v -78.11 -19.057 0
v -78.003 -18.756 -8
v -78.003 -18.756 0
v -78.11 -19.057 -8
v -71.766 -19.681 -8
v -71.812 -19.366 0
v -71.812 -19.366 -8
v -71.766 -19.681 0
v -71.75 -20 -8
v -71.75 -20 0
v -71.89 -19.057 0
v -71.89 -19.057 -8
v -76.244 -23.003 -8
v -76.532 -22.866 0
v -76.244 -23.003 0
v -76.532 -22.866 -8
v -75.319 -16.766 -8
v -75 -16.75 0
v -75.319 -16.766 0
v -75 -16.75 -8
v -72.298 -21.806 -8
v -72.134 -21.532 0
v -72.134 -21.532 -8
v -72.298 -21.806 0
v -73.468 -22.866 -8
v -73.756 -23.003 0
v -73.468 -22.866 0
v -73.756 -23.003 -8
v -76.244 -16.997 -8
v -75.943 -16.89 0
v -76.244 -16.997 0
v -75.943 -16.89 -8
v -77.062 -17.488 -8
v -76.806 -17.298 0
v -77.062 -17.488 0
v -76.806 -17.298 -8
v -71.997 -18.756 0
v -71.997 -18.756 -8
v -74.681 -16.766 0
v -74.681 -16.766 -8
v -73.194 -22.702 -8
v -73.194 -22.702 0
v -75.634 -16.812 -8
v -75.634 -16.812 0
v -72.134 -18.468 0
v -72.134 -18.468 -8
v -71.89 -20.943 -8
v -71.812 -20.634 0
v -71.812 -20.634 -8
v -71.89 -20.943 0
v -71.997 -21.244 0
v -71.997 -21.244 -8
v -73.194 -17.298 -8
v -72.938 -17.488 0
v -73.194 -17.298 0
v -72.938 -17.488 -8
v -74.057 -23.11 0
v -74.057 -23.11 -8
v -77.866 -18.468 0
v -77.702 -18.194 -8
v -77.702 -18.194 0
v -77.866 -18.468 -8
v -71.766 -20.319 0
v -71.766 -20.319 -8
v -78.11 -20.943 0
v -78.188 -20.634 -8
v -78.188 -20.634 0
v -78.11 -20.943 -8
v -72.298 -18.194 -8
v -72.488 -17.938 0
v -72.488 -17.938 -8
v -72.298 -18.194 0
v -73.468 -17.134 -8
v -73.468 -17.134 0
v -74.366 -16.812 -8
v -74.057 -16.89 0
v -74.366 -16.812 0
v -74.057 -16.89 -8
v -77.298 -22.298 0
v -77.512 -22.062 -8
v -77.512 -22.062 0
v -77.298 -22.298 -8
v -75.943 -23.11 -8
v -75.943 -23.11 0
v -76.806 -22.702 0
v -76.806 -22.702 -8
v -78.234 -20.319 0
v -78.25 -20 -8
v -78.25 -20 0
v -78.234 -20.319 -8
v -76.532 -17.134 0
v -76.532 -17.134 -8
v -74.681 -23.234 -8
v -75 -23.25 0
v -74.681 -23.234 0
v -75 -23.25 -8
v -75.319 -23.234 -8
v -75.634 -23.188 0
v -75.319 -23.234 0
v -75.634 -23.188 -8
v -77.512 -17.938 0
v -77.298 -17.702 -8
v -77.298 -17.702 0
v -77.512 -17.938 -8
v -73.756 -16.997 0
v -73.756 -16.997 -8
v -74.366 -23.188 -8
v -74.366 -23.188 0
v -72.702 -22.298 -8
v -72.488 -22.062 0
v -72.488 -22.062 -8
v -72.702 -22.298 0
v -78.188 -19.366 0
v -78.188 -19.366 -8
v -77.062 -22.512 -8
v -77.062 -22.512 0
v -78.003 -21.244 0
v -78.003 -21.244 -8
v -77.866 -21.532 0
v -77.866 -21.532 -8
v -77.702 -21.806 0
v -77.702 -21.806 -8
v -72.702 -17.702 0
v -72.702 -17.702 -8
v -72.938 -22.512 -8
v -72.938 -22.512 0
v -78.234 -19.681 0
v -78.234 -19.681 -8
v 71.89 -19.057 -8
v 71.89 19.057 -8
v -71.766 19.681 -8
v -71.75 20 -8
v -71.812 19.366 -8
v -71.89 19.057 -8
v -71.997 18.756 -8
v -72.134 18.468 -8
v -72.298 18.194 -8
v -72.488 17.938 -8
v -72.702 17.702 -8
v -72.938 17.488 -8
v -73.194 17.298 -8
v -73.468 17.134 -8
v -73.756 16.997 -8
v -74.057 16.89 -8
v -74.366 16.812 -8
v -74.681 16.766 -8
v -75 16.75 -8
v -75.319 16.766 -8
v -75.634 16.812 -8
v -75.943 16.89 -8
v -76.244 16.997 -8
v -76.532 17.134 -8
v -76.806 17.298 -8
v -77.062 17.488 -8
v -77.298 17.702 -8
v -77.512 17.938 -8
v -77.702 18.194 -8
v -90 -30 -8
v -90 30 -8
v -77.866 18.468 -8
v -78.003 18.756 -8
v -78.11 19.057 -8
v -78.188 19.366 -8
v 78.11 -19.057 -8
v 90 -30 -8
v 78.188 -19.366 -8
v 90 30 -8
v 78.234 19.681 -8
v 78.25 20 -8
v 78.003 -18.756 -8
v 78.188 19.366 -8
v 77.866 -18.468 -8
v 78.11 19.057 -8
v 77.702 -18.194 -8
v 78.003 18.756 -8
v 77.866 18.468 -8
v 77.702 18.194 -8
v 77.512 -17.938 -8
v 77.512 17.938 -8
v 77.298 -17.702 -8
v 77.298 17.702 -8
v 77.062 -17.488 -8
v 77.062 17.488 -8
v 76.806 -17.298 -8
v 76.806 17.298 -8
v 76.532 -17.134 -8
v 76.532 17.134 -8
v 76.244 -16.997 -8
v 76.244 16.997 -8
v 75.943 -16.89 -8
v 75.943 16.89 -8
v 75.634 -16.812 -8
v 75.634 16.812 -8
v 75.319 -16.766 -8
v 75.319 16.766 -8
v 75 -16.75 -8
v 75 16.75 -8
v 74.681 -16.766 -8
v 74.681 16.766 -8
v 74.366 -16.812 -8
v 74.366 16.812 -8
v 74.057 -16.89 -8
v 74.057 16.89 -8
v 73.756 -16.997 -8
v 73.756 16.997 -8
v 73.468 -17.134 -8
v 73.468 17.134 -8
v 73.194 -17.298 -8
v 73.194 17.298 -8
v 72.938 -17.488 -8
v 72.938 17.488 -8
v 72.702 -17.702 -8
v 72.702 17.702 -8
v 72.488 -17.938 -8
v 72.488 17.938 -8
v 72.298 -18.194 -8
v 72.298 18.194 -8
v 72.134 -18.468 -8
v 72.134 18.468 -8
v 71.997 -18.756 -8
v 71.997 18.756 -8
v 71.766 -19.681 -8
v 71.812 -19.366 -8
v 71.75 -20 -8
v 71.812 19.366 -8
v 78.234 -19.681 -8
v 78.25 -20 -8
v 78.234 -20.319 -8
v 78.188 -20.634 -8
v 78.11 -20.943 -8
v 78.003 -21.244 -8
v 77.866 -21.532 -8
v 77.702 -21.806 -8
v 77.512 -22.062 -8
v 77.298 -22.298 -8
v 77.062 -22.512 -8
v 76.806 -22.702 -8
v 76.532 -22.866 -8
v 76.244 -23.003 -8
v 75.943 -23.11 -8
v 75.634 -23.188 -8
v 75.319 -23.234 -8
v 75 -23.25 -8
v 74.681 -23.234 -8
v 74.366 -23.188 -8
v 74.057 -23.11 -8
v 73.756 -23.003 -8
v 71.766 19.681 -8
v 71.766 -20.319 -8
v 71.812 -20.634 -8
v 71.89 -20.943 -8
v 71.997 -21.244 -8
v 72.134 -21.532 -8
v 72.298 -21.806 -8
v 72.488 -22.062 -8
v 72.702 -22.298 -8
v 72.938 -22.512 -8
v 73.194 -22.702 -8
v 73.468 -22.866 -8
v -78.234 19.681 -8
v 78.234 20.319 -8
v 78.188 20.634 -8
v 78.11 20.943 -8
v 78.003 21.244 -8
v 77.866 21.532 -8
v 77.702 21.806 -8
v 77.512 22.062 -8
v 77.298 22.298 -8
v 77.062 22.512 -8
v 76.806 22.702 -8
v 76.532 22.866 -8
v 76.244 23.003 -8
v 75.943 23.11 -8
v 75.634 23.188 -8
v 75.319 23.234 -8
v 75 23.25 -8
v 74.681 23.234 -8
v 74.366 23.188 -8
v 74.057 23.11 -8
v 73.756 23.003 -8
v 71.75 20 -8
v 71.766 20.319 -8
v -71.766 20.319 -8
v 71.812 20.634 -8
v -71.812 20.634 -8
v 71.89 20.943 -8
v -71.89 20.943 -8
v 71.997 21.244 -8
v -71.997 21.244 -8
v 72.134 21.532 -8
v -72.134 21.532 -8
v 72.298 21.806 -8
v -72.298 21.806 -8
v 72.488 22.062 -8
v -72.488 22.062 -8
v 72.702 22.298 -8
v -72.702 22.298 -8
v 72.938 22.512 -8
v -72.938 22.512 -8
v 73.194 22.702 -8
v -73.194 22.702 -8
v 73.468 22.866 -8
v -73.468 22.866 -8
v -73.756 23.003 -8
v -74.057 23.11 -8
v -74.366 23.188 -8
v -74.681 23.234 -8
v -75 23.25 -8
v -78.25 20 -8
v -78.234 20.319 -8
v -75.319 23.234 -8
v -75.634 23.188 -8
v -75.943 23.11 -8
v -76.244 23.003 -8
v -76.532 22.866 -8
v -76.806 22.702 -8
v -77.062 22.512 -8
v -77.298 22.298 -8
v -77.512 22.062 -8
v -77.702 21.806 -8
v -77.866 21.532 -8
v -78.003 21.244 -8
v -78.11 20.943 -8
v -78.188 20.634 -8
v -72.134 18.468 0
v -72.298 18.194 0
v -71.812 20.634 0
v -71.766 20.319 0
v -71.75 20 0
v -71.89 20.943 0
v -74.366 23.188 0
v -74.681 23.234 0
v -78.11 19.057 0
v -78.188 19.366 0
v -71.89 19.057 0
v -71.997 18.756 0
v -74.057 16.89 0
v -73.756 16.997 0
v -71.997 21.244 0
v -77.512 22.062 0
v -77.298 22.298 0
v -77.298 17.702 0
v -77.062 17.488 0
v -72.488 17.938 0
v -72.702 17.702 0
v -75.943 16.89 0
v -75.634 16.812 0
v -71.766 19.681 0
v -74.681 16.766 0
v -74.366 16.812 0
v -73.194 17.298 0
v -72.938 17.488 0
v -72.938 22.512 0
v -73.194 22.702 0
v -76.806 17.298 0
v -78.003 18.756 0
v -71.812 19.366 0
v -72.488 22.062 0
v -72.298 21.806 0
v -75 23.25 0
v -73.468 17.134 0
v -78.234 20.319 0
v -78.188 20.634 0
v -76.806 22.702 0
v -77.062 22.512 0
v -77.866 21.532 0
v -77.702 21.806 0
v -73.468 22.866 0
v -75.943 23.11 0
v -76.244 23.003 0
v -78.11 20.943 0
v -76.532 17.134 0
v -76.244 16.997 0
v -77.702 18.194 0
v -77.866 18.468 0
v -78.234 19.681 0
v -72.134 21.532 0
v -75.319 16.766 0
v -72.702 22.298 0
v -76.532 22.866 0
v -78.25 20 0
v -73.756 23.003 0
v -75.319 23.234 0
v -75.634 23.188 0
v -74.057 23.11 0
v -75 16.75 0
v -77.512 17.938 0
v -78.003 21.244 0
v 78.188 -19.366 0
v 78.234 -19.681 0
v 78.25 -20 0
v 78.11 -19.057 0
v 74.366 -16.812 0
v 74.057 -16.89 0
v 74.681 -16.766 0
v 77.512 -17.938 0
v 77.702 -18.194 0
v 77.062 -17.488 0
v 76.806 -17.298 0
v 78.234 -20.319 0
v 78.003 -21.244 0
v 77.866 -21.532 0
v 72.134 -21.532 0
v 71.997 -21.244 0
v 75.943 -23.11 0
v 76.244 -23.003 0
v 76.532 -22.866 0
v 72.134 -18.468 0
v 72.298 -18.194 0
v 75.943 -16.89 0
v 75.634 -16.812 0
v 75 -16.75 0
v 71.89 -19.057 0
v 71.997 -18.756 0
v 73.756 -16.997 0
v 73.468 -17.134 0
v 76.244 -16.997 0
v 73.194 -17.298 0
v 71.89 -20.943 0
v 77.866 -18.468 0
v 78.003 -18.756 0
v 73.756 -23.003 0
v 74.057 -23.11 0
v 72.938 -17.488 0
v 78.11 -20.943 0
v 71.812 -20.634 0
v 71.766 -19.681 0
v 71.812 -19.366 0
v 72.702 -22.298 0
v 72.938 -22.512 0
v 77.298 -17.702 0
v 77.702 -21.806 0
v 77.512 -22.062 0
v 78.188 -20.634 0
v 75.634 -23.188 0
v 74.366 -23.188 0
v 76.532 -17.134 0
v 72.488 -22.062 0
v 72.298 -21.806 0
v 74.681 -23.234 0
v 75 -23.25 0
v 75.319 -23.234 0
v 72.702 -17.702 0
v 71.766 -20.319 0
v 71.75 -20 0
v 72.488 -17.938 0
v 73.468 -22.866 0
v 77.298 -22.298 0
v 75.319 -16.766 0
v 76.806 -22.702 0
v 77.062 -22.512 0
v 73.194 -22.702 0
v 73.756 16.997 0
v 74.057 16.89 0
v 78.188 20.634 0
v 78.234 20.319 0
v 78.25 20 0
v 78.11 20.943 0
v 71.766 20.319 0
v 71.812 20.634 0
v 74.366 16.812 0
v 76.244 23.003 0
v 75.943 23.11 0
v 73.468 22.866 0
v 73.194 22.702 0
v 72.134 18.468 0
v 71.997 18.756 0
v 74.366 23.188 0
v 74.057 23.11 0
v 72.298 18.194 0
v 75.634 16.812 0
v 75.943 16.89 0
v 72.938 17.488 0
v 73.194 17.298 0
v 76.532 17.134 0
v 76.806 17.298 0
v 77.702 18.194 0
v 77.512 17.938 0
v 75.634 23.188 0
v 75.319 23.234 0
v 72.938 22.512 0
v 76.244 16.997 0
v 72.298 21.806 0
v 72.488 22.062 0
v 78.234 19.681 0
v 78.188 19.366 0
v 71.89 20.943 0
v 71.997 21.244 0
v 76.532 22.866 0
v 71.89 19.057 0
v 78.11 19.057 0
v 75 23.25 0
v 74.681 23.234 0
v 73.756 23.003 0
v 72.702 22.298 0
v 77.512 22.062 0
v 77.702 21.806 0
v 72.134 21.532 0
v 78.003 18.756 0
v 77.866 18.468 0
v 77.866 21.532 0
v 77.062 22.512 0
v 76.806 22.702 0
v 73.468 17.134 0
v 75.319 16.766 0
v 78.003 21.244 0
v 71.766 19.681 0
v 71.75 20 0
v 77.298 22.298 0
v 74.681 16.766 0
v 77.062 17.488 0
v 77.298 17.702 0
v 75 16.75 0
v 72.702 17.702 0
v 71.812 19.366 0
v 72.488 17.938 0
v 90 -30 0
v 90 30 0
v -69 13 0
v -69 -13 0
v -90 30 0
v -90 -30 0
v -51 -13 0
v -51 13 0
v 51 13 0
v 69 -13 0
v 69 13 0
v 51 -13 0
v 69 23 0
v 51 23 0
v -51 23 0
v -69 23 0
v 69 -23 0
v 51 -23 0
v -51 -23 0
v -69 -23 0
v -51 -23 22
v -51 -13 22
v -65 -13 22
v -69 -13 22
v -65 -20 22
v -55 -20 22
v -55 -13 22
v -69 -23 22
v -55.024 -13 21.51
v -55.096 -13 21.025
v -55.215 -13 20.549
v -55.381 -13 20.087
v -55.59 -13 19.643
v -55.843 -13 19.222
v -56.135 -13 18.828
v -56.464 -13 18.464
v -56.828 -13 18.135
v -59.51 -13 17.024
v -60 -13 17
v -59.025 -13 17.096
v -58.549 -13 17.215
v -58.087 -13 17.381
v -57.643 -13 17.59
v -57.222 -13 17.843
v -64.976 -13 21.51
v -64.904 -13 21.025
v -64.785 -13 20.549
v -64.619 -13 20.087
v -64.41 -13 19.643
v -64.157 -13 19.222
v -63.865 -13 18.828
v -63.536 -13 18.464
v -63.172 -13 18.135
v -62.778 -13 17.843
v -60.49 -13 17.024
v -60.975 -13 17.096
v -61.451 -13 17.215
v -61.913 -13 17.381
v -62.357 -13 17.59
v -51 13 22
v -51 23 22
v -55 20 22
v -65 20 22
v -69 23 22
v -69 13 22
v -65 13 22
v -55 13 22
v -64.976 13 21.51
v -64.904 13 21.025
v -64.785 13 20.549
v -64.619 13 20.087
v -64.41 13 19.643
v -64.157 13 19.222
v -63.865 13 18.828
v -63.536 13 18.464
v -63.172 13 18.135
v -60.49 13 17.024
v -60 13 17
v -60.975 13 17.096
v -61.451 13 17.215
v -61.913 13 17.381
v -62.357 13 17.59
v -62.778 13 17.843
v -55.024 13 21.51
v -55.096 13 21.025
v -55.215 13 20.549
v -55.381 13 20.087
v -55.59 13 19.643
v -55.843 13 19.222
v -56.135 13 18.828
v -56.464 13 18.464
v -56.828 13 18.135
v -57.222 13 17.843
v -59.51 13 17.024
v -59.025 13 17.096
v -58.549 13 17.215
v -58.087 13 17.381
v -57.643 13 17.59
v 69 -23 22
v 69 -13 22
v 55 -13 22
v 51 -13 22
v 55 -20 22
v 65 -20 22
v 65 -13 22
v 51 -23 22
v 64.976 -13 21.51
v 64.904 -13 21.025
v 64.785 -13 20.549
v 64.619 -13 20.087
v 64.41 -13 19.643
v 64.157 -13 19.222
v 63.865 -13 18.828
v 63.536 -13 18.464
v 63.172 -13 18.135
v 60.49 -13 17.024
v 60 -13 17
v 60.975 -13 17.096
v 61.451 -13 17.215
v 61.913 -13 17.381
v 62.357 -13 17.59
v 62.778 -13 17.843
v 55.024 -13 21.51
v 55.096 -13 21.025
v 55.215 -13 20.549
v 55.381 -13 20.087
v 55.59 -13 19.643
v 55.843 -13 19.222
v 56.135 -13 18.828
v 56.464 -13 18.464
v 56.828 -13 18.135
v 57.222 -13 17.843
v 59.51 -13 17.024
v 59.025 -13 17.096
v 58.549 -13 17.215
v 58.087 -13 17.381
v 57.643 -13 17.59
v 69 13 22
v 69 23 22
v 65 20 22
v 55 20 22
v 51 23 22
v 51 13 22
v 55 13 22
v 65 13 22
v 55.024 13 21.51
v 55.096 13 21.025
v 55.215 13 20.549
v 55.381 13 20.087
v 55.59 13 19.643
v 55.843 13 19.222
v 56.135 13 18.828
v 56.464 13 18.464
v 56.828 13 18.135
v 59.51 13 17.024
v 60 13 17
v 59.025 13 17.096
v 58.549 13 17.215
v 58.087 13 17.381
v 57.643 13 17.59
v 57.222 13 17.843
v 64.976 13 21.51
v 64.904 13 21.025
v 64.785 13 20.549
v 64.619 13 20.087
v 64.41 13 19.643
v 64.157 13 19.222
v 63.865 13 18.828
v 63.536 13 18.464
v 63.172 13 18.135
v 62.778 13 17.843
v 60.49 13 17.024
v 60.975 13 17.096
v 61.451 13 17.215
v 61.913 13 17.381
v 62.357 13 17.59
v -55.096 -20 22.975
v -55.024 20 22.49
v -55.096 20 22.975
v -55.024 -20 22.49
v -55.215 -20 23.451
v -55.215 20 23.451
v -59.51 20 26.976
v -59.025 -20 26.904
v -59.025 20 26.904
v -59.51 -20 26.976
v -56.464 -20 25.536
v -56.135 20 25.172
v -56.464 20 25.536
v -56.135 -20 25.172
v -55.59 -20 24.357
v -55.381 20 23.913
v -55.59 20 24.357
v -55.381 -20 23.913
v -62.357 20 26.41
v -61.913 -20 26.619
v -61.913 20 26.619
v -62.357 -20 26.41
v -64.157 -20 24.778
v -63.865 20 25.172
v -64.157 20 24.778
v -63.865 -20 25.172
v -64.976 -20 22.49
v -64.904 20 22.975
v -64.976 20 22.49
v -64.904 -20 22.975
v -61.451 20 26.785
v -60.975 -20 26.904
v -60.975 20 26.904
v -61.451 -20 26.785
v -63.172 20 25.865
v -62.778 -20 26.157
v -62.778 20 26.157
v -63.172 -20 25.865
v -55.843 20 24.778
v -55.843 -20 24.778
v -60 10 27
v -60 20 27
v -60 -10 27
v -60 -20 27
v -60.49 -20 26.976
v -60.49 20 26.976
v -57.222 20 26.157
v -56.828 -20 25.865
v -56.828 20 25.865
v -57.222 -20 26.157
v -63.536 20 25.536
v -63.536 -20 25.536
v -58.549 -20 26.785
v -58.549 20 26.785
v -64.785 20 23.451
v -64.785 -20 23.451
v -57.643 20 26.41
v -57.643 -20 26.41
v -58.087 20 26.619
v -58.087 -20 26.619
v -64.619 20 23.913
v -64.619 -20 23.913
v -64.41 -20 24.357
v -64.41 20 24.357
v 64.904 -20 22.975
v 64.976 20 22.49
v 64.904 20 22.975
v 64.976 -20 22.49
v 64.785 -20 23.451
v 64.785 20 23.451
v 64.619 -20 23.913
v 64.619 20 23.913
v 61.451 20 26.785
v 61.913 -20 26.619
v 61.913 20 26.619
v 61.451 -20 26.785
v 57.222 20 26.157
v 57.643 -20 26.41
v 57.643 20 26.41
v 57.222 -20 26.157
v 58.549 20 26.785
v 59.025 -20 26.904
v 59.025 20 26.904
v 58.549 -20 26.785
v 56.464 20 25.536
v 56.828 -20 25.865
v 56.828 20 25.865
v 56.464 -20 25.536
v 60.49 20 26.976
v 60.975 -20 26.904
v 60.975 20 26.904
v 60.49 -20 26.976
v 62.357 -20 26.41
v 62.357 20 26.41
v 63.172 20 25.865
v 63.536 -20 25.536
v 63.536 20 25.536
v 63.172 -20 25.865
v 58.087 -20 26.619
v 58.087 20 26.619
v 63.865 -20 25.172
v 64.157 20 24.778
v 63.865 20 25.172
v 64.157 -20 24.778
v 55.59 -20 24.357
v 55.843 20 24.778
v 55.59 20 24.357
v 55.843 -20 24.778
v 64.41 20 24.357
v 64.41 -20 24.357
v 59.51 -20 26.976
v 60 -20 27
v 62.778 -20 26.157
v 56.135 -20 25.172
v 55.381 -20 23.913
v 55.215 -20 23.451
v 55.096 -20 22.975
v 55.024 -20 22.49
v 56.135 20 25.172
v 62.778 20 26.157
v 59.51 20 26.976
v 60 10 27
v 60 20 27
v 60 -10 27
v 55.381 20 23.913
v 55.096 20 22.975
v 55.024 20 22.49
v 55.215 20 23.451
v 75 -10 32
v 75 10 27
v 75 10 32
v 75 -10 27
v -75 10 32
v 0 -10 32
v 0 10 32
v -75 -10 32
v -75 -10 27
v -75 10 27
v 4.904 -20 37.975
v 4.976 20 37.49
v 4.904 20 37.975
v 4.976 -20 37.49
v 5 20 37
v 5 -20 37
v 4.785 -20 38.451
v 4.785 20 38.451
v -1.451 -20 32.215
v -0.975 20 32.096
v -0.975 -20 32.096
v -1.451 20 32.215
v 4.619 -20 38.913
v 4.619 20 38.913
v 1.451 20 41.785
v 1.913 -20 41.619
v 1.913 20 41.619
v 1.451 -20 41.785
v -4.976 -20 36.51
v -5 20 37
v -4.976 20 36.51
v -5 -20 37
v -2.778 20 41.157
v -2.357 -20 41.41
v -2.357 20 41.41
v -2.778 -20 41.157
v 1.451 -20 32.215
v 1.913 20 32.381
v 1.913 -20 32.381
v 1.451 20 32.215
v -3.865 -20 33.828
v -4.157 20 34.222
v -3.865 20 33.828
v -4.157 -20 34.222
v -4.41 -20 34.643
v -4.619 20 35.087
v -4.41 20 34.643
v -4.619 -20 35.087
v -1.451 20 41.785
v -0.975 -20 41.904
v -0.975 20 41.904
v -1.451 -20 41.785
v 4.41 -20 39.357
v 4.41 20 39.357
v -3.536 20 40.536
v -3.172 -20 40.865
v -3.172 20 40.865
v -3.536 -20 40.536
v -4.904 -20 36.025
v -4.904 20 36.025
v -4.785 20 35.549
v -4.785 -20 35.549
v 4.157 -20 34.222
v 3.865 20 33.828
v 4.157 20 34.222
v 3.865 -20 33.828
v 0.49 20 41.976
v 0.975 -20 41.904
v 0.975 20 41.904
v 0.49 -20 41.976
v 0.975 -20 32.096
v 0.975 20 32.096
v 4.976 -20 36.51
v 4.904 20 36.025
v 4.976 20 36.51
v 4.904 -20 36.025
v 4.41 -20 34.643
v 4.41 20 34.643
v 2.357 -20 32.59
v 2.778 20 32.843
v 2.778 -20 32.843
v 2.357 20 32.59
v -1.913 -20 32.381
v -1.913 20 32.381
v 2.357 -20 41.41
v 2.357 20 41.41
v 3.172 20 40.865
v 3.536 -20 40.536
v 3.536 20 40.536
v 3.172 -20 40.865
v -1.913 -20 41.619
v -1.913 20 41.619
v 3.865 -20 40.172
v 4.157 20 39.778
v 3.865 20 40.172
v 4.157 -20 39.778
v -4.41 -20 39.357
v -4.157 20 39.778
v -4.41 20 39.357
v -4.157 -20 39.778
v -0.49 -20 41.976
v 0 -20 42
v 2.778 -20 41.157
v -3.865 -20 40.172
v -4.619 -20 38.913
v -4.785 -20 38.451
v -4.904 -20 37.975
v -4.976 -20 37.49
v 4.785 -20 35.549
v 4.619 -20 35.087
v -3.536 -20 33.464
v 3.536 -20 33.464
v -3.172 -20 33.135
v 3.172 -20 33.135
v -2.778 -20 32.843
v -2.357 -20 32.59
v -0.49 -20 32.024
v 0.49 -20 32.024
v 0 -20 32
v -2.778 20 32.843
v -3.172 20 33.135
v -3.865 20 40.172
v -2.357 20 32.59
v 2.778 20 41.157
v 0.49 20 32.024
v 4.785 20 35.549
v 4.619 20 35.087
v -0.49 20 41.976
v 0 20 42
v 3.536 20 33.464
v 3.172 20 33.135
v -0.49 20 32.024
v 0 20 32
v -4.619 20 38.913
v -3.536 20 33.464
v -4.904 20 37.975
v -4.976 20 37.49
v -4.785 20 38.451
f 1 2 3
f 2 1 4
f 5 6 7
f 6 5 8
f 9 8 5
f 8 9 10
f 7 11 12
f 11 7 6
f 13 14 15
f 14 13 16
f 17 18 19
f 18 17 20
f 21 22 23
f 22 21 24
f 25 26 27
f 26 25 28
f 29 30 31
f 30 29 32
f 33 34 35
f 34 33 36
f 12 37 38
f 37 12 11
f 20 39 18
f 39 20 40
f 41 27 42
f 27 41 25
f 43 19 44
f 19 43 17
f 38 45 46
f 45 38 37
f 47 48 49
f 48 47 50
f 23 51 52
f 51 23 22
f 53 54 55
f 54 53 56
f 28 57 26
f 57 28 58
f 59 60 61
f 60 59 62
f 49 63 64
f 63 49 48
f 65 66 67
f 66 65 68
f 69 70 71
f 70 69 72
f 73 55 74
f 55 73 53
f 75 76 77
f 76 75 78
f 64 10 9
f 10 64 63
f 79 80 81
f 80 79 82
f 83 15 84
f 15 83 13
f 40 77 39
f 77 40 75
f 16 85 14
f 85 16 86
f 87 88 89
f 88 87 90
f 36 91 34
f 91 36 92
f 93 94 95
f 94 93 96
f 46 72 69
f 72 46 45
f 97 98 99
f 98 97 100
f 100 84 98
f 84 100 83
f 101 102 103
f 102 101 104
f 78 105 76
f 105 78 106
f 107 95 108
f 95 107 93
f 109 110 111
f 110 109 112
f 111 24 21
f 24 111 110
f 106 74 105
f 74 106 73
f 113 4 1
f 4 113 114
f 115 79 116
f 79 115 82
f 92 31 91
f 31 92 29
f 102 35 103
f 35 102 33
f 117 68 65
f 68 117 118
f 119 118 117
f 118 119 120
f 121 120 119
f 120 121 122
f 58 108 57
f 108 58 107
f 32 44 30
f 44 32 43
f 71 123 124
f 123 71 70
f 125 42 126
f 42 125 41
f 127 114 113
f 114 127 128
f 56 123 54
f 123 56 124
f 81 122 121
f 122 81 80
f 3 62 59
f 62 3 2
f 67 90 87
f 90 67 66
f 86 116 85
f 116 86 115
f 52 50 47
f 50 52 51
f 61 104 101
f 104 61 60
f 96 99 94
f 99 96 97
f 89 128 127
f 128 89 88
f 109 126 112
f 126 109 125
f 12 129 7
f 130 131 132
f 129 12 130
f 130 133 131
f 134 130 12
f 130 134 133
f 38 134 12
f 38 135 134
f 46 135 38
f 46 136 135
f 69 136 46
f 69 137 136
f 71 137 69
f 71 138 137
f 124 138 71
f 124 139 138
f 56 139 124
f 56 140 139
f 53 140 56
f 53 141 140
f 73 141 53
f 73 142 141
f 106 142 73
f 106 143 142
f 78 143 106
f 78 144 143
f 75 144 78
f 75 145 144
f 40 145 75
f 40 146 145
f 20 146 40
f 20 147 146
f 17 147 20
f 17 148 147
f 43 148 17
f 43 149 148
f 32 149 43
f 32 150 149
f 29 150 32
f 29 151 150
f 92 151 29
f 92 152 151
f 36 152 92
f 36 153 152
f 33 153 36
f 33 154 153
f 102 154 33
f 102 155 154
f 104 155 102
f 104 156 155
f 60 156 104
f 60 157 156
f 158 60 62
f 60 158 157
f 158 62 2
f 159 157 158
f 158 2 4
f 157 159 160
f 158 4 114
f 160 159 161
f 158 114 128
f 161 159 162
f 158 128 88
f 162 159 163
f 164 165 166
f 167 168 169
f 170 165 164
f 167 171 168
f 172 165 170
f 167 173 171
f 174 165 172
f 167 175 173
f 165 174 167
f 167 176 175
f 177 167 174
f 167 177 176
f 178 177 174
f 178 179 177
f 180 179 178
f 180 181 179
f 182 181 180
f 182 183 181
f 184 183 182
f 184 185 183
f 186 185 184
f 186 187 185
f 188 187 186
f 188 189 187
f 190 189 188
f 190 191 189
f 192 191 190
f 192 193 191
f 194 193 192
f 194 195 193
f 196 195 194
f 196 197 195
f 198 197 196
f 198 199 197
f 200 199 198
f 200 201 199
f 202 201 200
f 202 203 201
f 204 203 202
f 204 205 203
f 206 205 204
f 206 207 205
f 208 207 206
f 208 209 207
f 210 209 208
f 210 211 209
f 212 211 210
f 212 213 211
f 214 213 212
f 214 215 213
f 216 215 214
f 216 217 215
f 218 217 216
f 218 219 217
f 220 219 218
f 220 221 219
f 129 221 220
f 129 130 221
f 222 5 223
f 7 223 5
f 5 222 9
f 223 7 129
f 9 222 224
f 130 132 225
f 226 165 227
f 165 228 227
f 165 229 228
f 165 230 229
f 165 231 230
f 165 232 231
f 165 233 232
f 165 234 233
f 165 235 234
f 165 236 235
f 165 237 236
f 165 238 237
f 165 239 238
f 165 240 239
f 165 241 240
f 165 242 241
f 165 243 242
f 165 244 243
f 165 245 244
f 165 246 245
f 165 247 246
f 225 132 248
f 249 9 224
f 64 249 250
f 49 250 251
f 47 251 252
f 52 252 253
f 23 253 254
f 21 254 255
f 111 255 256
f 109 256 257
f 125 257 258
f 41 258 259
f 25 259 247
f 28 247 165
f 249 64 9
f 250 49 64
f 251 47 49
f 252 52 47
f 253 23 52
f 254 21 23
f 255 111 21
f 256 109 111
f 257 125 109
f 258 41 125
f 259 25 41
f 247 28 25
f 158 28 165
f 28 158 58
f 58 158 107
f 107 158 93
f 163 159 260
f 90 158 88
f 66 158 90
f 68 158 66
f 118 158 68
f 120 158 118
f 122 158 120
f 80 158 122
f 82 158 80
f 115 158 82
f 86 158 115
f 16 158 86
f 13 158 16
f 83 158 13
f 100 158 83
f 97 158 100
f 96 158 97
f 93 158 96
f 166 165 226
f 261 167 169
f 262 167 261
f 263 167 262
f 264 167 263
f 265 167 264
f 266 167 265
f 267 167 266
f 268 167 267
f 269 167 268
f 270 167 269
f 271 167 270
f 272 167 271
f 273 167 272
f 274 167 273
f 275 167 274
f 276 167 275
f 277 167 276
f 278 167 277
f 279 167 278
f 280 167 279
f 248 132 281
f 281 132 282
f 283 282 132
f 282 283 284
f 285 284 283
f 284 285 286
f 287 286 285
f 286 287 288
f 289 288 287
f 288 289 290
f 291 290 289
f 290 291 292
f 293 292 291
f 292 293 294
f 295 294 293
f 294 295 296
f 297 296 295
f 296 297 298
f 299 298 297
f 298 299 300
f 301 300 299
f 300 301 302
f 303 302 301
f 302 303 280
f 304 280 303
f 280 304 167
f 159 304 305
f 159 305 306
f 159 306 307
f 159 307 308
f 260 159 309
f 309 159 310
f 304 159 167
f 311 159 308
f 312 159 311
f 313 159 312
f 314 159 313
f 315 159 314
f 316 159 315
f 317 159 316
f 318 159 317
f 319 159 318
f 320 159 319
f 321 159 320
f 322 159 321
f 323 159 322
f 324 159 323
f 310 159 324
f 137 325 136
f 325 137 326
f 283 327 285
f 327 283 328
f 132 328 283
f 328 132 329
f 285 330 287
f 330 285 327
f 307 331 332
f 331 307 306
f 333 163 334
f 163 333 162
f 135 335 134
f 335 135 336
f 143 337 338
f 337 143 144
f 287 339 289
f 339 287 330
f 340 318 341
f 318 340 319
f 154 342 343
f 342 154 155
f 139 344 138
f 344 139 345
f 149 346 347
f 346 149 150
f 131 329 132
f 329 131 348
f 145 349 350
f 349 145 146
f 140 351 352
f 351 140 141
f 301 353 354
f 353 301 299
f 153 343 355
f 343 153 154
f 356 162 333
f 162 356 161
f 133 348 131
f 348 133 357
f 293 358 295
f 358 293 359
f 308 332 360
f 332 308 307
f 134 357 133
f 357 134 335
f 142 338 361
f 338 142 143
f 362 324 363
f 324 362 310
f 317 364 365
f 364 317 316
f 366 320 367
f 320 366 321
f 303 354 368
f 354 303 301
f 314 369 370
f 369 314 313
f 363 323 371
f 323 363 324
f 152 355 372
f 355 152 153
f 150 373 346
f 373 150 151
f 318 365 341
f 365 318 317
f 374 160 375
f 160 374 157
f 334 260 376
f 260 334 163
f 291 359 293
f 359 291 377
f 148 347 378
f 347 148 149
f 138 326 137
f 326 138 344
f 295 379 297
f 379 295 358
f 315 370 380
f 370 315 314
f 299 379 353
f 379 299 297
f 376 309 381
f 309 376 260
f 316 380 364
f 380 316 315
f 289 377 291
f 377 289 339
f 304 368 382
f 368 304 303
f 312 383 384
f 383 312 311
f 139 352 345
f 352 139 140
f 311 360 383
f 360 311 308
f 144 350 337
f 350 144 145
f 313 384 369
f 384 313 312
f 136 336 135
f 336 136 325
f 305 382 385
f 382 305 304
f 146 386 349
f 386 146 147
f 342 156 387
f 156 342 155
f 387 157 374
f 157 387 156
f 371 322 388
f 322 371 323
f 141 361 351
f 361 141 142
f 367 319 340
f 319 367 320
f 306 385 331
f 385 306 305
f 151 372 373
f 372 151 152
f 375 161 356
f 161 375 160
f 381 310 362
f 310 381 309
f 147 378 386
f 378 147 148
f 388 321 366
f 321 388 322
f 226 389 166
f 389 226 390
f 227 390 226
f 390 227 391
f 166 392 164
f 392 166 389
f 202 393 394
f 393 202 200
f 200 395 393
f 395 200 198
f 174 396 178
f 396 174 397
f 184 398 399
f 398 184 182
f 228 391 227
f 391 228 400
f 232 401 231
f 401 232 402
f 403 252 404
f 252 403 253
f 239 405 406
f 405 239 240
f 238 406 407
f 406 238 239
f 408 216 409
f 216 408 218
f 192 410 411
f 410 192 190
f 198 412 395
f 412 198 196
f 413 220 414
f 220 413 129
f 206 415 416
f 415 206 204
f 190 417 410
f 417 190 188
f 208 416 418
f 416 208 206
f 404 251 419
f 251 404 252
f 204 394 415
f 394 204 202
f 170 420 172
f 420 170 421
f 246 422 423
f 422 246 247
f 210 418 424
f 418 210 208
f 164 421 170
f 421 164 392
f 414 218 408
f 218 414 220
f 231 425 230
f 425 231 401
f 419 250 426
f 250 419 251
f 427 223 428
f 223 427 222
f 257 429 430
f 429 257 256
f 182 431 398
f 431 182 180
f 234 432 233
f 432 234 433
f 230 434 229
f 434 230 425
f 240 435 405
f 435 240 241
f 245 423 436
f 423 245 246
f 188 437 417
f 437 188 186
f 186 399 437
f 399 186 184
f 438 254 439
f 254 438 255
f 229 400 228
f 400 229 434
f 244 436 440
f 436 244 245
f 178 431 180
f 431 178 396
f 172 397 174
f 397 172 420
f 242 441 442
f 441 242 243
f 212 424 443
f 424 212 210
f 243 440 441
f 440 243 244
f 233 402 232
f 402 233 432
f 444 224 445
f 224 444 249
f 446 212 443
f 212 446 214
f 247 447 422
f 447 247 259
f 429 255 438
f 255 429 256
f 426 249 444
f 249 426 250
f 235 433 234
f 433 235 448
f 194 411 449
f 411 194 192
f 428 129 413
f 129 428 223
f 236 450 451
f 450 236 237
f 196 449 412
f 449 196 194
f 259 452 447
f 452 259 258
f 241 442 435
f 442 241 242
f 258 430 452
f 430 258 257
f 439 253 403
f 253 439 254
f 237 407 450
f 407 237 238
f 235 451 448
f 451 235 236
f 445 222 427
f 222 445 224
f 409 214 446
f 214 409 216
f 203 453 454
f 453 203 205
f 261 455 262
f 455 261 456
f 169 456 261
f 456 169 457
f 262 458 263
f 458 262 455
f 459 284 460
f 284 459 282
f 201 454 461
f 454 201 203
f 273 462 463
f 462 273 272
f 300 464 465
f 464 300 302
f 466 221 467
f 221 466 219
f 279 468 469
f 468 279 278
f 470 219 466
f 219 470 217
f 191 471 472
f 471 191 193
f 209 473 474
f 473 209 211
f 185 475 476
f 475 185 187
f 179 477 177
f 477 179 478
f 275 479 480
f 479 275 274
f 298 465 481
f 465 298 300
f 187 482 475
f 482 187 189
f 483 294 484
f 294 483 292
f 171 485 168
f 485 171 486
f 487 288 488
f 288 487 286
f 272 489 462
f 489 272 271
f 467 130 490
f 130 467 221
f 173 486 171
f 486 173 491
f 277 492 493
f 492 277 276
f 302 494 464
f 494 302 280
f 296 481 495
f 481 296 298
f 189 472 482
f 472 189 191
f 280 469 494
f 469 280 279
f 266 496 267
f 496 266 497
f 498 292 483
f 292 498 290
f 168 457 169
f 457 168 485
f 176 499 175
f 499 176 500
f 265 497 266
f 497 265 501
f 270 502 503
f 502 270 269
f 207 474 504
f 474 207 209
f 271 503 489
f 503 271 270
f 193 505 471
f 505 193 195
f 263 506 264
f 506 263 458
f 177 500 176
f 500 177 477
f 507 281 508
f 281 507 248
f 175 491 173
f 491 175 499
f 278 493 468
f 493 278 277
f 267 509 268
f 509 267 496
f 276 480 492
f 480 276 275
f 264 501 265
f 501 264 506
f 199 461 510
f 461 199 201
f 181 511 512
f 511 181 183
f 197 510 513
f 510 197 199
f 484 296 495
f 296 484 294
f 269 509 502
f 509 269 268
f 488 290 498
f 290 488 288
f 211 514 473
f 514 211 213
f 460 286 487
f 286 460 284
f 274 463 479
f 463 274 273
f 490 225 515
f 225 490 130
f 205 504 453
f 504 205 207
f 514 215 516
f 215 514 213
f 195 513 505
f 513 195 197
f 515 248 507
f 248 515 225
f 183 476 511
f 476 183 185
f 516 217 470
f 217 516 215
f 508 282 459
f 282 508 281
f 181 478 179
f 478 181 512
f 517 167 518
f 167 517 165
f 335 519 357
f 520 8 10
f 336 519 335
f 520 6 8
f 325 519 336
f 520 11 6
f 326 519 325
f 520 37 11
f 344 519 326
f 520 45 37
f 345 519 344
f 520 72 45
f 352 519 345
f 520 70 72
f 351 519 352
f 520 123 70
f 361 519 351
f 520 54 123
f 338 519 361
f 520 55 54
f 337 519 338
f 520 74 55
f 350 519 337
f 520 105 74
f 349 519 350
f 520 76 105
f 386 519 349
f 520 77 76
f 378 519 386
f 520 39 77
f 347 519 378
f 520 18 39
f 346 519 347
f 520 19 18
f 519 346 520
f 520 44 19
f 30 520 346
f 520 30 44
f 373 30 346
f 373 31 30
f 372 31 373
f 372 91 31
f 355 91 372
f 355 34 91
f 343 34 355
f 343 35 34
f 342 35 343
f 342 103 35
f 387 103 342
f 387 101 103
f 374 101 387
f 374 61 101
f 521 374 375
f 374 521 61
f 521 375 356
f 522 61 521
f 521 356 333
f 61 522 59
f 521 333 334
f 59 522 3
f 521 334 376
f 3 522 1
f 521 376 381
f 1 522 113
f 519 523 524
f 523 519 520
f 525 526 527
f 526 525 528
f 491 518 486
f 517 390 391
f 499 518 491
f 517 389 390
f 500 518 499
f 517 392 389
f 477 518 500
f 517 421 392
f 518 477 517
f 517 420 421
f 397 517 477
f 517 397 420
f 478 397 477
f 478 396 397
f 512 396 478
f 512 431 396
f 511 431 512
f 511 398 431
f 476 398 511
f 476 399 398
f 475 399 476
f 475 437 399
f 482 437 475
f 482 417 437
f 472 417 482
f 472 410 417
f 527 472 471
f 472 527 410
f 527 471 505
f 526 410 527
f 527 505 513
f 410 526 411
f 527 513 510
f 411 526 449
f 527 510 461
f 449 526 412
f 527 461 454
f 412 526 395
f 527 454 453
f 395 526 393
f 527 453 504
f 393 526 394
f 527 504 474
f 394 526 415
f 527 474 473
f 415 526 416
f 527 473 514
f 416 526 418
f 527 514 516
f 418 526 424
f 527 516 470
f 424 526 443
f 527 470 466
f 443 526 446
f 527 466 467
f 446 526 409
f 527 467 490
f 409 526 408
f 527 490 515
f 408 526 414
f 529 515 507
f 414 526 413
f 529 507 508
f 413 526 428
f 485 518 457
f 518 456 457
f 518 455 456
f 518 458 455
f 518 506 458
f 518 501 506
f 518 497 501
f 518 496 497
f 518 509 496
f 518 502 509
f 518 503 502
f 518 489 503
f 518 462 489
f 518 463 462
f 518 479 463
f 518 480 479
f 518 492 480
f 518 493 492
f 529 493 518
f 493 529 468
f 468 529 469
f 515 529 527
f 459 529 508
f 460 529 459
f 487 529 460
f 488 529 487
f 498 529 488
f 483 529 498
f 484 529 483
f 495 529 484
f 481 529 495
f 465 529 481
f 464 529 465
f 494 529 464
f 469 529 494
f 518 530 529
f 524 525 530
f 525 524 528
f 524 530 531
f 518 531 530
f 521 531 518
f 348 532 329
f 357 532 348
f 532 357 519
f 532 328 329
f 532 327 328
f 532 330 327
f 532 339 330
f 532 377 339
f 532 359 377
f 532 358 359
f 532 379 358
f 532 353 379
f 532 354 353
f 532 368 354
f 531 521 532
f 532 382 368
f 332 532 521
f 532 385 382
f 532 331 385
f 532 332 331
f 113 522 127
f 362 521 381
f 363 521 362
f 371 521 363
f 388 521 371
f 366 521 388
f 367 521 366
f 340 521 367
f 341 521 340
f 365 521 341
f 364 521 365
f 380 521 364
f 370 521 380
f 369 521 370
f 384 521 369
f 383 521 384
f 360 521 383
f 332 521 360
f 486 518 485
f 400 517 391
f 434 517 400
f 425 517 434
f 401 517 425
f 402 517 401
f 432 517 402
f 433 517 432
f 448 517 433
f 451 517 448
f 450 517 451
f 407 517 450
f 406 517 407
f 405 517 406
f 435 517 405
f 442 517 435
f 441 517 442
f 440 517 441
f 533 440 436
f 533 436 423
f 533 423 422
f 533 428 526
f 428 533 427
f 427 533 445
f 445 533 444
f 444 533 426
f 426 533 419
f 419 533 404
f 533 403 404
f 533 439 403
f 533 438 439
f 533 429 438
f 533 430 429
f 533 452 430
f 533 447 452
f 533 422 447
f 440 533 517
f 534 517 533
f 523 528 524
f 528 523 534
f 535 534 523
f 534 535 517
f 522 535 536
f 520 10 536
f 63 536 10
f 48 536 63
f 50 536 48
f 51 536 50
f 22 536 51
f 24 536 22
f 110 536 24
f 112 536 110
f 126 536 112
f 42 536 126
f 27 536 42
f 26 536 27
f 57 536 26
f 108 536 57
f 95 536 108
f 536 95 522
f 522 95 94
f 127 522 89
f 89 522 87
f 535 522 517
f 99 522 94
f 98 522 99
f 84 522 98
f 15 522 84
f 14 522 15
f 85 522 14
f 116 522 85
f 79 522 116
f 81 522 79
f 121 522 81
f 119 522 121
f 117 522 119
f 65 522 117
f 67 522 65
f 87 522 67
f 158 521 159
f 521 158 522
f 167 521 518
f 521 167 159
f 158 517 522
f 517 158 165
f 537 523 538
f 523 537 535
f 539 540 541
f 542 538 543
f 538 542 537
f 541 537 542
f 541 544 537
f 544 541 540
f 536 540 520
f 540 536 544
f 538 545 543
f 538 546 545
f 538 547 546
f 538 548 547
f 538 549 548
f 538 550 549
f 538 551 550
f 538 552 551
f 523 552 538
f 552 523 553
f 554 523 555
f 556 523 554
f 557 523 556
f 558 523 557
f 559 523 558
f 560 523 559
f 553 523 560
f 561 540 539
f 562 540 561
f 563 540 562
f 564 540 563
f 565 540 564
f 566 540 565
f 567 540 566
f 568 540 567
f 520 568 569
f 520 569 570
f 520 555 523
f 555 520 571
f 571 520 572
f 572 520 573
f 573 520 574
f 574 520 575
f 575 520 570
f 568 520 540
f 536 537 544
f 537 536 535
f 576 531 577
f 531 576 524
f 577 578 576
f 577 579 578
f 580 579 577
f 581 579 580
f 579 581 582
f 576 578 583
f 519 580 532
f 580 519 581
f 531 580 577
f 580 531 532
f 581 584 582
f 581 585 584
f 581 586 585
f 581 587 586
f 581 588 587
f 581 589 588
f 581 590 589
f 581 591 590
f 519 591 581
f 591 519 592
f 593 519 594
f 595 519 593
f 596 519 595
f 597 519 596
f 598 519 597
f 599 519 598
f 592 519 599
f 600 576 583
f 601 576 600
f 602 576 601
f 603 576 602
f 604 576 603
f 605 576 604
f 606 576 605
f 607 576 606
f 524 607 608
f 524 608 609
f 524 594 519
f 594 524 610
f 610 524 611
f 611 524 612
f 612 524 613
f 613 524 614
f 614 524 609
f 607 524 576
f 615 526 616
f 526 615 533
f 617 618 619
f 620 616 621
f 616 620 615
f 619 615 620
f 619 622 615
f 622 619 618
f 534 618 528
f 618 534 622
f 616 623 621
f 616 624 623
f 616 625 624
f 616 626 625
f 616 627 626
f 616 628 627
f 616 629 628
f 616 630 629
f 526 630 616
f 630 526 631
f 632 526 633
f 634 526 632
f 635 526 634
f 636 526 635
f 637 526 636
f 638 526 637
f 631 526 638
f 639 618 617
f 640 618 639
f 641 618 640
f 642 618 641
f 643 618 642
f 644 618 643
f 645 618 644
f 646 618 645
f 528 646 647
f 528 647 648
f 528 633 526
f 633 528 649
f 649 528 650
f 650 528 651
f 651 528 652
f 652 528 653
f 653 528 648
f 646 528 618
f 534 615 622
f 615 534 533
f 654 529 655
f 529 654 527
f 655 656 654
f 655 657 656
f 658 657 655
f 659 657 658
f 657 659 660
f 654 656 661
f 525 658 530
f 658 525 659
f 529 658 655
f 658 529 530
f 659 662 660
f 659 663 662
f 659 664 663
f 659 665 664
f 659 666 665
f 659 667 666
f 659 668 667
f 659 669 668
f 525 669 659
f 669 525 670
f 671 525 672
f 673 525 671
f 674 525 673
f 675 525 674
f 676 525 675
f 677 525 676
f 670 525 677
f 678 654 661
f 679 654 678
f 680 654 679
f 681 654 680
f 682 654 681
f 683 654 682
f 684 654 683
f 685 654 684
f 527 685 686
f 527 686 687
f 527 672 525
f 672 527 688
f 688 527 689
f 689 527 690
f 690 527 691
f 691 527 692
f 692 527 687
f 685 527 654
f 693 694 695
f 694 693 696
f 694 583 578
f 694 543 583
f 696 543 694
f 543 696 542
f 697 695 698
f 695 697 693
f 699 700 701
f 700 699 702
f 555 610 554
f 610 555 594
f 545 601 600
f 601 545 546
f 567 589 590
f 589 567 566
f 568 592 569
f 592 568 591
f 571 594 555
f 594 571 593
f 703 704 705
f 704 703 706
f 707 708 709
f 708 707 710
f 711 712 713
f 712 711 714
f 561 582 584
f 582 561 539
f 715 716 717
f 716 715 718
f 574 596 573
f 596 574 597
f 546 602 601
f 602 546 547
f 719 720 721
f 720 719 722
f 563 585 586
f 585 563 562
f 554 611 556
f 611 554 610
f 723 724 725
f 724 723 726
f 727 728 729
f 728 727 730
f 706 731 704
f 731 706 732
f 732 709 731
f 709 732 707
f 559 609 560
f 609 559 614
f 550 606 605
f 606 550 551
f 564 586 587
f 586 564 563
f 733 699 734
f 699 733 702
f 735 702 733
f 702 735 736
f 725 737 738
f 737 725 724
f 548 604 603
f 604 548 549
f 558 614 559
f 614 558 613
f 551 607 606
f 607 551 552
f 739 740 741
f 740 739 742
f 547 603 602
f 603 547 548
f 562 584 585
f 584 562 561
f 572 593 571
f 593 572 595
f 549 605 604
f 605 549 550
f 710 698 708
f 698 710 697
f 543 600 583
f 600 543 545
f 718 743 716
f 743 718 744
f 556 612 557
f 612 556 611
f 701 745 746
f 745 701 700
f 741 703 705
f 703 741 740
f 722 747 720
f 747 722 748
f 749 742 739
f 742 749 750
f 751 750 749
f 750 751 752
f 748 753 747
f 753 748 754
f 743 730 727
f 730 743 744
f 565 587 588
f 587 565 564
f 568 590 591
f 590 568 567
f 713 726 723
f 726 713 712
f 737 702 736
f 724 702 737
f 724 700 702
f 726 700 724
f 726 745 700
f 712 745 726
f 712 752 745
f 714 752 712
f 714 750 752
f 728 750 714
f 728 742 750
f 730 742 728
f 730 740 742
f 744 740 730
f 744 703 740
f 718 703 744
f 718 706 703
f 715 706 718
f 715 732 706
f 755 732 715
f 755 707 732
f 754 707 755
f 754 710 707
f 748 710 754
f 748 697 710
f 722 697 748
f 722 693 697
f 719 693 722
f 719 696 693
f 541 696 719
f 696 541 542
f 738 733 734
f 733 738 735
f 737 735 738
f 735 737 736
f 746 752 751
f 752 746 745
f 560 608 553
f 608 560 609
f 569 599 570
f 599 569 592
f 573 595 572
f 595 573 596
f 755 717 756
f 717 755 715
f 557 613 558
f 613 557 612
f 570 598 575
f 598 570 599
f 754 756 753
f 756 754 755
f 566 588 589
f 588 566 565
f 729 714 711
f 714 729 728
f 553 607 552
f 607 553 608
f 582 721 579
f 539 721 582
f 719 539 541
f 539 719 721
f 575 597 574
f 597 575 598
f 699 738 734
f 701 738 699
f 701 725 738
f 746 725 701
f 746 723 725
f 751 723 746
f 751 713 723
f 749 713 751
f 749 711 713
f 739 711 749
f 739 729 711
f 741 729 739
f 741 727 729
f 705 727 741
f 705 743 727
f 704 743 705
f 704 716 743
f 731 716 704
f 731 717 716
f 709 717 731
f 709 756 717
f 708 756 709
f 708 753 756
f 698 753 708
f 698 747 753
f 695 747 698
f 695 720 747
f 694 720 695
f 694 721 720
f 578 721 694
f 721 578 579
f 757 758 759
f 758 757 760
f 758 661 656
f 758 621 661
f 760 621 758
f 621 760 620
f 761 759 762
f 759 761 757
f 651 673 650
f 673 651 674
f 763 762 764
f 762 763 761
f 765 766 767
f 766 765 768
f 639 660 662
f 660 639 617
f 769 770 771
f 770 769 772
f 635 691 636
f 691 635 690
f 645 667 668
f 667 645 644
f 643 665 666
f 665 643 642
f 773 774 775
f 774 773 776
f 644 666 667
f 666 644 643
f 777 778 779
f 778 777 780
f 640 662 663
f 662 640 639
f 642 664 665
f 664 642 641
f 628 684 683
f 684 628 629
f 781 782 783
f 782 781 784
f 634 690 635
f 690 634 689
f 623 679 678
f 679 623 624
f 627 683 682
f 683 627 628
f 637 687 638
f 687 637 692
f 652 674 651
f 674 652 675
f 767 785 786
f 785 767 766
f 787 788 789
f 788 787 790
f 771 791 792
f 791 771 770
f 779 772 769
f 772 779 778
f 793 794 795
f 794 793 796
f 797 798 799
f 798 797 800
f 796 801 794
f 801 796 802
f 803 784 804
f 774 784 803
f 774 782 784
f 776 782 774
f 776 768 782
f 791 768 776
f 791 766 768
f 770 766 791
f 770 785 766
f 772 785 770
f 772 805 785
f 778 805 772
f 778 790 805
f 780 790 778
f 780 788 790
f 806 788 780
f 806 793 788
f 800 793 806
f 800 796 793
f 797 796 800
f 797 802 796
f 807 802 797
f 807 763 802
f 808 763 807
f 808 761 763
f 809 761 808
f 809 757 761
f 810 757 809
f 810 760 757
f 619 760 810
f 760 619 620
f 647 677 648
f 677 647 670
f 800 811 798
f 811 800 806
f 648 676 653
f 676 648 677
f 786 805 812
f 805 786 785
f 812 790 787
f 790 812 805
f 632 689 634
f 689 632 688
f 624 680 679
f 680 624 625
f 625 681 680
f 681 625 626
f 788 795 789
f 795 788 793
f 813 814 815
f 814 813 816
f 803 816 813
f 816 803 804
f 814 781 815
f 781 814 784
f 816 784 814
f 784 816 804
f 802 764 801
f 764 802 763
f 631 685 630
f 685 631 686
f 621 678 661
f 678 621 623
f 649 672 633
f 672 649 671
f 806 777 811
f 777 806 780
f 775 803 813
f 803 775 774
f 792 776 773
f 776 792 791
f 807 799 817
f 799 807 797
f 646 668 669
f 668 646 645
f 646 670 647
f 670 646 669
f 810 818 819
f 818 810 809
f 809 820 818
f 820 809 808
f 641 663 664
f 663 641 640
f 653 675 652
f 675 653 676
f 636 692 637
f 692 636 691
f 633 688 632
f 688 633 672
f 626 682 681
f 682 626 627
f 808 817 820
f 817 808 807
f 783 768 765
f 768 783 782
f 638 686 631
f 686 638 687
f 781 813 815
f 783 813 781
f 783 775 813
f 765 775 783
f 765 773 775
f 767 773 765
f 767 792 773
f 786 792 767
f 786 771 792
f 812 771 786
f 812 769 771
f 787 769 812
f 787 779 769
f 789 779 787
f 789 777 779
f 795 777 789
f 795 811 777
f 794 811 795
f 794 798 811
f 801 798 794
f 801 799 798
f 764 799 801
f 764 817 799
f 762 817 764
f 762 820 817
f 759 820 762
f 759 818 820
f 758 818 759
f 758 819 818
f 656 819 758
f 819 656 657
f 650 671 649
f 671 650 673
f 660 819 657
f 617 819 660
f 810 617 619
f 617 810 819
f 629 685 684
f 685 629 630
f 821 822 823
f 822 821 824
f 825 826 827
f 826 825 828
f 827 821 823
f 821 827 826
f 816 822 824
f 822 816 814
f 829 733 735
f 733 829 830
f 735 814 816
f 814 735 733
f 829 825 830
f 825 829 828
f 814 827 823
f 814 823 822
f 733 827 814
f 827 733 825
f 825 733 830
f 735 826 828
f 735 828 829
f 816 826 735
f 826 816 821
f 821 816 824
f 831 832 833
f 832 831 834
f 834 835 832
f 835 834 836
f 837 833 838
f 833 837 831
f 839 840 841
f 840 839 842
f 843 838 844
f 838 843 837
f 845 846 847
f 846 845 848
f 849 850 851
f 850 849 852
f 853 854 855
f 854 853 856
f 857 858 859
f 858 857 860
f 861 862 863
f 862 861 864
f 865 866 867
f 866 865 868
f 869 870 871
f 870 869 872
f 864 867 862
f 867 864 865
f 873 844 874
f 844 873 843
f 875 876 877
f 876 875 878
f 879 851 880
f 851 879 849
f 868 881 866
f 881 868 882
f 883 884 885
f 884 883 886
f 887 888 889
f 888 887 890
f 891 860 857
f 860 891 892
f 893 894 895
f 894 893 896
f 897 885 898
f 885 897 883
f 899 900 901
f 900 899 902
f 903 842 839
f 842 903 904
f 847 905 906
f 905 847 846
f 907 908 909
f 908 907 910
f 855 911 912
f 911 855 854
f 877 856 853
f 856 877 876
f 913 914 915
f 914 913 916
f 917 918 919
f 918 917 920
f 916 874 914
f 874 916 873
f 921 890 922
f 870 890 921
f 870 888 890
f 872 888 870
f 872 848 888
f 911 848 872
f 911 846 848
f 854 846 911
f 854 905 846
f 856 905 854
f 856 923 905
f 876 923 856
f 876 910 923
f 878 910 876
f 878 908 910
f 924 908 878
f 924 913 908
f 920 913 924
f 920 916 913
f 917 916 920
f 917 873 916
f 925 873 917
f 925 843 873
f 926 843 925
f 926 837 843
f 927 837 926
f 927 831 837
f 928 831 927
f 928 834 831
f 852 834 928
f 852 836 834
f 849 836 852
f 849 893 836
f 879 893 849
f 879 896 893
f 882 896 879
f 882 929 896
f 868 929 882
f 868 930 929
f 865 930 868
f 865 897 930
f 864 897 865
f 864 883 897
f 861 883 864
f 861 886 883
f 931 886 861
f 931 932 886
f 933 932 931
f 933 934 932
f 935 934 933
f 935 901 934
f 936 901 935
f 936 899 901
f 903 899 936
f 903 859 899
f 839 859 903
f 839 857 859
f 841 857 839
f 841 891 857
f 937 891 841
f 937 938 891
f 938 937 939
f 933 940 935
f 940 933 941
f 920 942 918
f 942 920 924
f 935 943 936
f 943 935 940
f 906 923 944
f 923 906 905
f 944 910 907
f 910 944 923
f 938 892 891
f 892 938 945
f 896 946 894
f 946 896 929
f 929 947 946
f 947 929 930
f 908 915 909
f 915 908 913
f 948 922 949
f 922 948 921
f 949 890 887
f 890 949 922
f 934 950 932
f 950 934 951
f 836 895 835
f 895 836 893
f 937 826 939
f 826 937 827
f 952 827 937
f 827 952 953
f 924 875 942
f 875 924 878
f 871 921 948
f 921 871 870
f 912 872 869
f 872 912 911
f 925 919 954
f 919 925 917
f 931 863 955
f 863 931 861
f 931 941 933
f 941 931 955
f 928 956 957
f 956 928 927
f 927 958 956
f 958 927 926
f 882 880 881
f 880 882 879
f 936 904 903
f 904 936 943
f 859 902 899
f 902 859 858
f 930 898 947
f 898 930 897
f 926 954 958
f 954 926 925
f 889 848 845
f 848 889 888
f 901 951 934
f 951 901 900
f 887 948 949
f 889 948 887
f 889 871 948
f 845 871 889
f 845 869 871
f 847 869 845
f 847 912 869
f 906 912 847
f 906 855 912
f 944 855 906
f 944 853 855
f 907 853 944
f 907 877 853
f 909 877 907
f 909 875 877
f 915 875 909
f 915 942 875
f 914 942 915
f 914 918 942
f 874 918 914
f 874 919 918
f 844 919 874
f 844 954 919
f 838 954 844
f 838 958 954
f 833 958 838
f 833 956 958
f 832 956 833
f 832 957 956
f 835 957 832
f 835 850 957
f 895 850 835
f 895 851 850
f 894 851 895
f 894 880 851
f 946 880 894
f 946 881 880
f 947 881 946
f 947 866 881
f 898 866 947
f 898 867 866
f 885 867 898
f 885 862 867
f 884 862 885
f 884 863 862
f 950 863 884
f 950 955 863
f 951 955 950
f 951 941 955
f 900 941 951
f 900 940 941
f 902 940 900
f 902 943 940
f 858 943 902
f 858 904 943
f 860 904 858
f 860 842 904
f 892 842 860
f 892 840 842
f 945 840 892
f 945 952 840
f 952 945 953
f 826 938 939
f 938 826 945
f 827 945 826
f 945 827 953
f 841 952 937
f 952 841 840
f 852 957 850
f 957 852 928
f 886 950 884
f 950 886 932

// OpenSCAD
// file: dimensions.scad
// Generated by examples/study.py for the selected laminate. Units: mm.
span = 120;
roller_d = 10;
coupon_width = 20;
coupon_t = 5;
base_l = 180;
base_w = 60;
base_t = 8;
support_h = 22;
// main file
// Concept fixture, dimensions in mm. Not a load-rated machine component.
// The dimensioned drawing is generated independently by examples/study.py.
$fn = 64;
include <dimensions.scad>;

module roller(x, z) {
    translate([x, 0, z]) rotate([90, 0, 0])
        cylinder(h=coupon_width+20, d=roller_d, center=true);
}

// Base and four mounting holes. Hole placement is a concept, not a fit spec.
color("silver") difference() {
    translate([0, 0, -base_t/2]) cube([base_l, base_w, base_t], center=true);
    for (x=[-75,75], y=[-20,20])
        translate([x,y,-base_t]) cylinder(h=base_t+1,d=6.5);
}
for (x=[-span/2,span/2]) {
    for(y=[-18,18]) color("gray")
        translate([x,y,support_h/2]) cube([18,10,support_h],center=true);
    color("steelblue") roller(x, support_h);
}
color([0.15,0.15,0.15,0.8])
    translate([0,0,support_h+roller_d/2+coupon_t/2]) cube([150,coupon_width,coupon_t],center=true);
color("darkorange") roller(0,support_h+roller_d+coupon_t);
// Upper roller is shown without a crosshead or load cell; those are interfaces
// to a calibrated test frame and must be designed for the actual equipment.
